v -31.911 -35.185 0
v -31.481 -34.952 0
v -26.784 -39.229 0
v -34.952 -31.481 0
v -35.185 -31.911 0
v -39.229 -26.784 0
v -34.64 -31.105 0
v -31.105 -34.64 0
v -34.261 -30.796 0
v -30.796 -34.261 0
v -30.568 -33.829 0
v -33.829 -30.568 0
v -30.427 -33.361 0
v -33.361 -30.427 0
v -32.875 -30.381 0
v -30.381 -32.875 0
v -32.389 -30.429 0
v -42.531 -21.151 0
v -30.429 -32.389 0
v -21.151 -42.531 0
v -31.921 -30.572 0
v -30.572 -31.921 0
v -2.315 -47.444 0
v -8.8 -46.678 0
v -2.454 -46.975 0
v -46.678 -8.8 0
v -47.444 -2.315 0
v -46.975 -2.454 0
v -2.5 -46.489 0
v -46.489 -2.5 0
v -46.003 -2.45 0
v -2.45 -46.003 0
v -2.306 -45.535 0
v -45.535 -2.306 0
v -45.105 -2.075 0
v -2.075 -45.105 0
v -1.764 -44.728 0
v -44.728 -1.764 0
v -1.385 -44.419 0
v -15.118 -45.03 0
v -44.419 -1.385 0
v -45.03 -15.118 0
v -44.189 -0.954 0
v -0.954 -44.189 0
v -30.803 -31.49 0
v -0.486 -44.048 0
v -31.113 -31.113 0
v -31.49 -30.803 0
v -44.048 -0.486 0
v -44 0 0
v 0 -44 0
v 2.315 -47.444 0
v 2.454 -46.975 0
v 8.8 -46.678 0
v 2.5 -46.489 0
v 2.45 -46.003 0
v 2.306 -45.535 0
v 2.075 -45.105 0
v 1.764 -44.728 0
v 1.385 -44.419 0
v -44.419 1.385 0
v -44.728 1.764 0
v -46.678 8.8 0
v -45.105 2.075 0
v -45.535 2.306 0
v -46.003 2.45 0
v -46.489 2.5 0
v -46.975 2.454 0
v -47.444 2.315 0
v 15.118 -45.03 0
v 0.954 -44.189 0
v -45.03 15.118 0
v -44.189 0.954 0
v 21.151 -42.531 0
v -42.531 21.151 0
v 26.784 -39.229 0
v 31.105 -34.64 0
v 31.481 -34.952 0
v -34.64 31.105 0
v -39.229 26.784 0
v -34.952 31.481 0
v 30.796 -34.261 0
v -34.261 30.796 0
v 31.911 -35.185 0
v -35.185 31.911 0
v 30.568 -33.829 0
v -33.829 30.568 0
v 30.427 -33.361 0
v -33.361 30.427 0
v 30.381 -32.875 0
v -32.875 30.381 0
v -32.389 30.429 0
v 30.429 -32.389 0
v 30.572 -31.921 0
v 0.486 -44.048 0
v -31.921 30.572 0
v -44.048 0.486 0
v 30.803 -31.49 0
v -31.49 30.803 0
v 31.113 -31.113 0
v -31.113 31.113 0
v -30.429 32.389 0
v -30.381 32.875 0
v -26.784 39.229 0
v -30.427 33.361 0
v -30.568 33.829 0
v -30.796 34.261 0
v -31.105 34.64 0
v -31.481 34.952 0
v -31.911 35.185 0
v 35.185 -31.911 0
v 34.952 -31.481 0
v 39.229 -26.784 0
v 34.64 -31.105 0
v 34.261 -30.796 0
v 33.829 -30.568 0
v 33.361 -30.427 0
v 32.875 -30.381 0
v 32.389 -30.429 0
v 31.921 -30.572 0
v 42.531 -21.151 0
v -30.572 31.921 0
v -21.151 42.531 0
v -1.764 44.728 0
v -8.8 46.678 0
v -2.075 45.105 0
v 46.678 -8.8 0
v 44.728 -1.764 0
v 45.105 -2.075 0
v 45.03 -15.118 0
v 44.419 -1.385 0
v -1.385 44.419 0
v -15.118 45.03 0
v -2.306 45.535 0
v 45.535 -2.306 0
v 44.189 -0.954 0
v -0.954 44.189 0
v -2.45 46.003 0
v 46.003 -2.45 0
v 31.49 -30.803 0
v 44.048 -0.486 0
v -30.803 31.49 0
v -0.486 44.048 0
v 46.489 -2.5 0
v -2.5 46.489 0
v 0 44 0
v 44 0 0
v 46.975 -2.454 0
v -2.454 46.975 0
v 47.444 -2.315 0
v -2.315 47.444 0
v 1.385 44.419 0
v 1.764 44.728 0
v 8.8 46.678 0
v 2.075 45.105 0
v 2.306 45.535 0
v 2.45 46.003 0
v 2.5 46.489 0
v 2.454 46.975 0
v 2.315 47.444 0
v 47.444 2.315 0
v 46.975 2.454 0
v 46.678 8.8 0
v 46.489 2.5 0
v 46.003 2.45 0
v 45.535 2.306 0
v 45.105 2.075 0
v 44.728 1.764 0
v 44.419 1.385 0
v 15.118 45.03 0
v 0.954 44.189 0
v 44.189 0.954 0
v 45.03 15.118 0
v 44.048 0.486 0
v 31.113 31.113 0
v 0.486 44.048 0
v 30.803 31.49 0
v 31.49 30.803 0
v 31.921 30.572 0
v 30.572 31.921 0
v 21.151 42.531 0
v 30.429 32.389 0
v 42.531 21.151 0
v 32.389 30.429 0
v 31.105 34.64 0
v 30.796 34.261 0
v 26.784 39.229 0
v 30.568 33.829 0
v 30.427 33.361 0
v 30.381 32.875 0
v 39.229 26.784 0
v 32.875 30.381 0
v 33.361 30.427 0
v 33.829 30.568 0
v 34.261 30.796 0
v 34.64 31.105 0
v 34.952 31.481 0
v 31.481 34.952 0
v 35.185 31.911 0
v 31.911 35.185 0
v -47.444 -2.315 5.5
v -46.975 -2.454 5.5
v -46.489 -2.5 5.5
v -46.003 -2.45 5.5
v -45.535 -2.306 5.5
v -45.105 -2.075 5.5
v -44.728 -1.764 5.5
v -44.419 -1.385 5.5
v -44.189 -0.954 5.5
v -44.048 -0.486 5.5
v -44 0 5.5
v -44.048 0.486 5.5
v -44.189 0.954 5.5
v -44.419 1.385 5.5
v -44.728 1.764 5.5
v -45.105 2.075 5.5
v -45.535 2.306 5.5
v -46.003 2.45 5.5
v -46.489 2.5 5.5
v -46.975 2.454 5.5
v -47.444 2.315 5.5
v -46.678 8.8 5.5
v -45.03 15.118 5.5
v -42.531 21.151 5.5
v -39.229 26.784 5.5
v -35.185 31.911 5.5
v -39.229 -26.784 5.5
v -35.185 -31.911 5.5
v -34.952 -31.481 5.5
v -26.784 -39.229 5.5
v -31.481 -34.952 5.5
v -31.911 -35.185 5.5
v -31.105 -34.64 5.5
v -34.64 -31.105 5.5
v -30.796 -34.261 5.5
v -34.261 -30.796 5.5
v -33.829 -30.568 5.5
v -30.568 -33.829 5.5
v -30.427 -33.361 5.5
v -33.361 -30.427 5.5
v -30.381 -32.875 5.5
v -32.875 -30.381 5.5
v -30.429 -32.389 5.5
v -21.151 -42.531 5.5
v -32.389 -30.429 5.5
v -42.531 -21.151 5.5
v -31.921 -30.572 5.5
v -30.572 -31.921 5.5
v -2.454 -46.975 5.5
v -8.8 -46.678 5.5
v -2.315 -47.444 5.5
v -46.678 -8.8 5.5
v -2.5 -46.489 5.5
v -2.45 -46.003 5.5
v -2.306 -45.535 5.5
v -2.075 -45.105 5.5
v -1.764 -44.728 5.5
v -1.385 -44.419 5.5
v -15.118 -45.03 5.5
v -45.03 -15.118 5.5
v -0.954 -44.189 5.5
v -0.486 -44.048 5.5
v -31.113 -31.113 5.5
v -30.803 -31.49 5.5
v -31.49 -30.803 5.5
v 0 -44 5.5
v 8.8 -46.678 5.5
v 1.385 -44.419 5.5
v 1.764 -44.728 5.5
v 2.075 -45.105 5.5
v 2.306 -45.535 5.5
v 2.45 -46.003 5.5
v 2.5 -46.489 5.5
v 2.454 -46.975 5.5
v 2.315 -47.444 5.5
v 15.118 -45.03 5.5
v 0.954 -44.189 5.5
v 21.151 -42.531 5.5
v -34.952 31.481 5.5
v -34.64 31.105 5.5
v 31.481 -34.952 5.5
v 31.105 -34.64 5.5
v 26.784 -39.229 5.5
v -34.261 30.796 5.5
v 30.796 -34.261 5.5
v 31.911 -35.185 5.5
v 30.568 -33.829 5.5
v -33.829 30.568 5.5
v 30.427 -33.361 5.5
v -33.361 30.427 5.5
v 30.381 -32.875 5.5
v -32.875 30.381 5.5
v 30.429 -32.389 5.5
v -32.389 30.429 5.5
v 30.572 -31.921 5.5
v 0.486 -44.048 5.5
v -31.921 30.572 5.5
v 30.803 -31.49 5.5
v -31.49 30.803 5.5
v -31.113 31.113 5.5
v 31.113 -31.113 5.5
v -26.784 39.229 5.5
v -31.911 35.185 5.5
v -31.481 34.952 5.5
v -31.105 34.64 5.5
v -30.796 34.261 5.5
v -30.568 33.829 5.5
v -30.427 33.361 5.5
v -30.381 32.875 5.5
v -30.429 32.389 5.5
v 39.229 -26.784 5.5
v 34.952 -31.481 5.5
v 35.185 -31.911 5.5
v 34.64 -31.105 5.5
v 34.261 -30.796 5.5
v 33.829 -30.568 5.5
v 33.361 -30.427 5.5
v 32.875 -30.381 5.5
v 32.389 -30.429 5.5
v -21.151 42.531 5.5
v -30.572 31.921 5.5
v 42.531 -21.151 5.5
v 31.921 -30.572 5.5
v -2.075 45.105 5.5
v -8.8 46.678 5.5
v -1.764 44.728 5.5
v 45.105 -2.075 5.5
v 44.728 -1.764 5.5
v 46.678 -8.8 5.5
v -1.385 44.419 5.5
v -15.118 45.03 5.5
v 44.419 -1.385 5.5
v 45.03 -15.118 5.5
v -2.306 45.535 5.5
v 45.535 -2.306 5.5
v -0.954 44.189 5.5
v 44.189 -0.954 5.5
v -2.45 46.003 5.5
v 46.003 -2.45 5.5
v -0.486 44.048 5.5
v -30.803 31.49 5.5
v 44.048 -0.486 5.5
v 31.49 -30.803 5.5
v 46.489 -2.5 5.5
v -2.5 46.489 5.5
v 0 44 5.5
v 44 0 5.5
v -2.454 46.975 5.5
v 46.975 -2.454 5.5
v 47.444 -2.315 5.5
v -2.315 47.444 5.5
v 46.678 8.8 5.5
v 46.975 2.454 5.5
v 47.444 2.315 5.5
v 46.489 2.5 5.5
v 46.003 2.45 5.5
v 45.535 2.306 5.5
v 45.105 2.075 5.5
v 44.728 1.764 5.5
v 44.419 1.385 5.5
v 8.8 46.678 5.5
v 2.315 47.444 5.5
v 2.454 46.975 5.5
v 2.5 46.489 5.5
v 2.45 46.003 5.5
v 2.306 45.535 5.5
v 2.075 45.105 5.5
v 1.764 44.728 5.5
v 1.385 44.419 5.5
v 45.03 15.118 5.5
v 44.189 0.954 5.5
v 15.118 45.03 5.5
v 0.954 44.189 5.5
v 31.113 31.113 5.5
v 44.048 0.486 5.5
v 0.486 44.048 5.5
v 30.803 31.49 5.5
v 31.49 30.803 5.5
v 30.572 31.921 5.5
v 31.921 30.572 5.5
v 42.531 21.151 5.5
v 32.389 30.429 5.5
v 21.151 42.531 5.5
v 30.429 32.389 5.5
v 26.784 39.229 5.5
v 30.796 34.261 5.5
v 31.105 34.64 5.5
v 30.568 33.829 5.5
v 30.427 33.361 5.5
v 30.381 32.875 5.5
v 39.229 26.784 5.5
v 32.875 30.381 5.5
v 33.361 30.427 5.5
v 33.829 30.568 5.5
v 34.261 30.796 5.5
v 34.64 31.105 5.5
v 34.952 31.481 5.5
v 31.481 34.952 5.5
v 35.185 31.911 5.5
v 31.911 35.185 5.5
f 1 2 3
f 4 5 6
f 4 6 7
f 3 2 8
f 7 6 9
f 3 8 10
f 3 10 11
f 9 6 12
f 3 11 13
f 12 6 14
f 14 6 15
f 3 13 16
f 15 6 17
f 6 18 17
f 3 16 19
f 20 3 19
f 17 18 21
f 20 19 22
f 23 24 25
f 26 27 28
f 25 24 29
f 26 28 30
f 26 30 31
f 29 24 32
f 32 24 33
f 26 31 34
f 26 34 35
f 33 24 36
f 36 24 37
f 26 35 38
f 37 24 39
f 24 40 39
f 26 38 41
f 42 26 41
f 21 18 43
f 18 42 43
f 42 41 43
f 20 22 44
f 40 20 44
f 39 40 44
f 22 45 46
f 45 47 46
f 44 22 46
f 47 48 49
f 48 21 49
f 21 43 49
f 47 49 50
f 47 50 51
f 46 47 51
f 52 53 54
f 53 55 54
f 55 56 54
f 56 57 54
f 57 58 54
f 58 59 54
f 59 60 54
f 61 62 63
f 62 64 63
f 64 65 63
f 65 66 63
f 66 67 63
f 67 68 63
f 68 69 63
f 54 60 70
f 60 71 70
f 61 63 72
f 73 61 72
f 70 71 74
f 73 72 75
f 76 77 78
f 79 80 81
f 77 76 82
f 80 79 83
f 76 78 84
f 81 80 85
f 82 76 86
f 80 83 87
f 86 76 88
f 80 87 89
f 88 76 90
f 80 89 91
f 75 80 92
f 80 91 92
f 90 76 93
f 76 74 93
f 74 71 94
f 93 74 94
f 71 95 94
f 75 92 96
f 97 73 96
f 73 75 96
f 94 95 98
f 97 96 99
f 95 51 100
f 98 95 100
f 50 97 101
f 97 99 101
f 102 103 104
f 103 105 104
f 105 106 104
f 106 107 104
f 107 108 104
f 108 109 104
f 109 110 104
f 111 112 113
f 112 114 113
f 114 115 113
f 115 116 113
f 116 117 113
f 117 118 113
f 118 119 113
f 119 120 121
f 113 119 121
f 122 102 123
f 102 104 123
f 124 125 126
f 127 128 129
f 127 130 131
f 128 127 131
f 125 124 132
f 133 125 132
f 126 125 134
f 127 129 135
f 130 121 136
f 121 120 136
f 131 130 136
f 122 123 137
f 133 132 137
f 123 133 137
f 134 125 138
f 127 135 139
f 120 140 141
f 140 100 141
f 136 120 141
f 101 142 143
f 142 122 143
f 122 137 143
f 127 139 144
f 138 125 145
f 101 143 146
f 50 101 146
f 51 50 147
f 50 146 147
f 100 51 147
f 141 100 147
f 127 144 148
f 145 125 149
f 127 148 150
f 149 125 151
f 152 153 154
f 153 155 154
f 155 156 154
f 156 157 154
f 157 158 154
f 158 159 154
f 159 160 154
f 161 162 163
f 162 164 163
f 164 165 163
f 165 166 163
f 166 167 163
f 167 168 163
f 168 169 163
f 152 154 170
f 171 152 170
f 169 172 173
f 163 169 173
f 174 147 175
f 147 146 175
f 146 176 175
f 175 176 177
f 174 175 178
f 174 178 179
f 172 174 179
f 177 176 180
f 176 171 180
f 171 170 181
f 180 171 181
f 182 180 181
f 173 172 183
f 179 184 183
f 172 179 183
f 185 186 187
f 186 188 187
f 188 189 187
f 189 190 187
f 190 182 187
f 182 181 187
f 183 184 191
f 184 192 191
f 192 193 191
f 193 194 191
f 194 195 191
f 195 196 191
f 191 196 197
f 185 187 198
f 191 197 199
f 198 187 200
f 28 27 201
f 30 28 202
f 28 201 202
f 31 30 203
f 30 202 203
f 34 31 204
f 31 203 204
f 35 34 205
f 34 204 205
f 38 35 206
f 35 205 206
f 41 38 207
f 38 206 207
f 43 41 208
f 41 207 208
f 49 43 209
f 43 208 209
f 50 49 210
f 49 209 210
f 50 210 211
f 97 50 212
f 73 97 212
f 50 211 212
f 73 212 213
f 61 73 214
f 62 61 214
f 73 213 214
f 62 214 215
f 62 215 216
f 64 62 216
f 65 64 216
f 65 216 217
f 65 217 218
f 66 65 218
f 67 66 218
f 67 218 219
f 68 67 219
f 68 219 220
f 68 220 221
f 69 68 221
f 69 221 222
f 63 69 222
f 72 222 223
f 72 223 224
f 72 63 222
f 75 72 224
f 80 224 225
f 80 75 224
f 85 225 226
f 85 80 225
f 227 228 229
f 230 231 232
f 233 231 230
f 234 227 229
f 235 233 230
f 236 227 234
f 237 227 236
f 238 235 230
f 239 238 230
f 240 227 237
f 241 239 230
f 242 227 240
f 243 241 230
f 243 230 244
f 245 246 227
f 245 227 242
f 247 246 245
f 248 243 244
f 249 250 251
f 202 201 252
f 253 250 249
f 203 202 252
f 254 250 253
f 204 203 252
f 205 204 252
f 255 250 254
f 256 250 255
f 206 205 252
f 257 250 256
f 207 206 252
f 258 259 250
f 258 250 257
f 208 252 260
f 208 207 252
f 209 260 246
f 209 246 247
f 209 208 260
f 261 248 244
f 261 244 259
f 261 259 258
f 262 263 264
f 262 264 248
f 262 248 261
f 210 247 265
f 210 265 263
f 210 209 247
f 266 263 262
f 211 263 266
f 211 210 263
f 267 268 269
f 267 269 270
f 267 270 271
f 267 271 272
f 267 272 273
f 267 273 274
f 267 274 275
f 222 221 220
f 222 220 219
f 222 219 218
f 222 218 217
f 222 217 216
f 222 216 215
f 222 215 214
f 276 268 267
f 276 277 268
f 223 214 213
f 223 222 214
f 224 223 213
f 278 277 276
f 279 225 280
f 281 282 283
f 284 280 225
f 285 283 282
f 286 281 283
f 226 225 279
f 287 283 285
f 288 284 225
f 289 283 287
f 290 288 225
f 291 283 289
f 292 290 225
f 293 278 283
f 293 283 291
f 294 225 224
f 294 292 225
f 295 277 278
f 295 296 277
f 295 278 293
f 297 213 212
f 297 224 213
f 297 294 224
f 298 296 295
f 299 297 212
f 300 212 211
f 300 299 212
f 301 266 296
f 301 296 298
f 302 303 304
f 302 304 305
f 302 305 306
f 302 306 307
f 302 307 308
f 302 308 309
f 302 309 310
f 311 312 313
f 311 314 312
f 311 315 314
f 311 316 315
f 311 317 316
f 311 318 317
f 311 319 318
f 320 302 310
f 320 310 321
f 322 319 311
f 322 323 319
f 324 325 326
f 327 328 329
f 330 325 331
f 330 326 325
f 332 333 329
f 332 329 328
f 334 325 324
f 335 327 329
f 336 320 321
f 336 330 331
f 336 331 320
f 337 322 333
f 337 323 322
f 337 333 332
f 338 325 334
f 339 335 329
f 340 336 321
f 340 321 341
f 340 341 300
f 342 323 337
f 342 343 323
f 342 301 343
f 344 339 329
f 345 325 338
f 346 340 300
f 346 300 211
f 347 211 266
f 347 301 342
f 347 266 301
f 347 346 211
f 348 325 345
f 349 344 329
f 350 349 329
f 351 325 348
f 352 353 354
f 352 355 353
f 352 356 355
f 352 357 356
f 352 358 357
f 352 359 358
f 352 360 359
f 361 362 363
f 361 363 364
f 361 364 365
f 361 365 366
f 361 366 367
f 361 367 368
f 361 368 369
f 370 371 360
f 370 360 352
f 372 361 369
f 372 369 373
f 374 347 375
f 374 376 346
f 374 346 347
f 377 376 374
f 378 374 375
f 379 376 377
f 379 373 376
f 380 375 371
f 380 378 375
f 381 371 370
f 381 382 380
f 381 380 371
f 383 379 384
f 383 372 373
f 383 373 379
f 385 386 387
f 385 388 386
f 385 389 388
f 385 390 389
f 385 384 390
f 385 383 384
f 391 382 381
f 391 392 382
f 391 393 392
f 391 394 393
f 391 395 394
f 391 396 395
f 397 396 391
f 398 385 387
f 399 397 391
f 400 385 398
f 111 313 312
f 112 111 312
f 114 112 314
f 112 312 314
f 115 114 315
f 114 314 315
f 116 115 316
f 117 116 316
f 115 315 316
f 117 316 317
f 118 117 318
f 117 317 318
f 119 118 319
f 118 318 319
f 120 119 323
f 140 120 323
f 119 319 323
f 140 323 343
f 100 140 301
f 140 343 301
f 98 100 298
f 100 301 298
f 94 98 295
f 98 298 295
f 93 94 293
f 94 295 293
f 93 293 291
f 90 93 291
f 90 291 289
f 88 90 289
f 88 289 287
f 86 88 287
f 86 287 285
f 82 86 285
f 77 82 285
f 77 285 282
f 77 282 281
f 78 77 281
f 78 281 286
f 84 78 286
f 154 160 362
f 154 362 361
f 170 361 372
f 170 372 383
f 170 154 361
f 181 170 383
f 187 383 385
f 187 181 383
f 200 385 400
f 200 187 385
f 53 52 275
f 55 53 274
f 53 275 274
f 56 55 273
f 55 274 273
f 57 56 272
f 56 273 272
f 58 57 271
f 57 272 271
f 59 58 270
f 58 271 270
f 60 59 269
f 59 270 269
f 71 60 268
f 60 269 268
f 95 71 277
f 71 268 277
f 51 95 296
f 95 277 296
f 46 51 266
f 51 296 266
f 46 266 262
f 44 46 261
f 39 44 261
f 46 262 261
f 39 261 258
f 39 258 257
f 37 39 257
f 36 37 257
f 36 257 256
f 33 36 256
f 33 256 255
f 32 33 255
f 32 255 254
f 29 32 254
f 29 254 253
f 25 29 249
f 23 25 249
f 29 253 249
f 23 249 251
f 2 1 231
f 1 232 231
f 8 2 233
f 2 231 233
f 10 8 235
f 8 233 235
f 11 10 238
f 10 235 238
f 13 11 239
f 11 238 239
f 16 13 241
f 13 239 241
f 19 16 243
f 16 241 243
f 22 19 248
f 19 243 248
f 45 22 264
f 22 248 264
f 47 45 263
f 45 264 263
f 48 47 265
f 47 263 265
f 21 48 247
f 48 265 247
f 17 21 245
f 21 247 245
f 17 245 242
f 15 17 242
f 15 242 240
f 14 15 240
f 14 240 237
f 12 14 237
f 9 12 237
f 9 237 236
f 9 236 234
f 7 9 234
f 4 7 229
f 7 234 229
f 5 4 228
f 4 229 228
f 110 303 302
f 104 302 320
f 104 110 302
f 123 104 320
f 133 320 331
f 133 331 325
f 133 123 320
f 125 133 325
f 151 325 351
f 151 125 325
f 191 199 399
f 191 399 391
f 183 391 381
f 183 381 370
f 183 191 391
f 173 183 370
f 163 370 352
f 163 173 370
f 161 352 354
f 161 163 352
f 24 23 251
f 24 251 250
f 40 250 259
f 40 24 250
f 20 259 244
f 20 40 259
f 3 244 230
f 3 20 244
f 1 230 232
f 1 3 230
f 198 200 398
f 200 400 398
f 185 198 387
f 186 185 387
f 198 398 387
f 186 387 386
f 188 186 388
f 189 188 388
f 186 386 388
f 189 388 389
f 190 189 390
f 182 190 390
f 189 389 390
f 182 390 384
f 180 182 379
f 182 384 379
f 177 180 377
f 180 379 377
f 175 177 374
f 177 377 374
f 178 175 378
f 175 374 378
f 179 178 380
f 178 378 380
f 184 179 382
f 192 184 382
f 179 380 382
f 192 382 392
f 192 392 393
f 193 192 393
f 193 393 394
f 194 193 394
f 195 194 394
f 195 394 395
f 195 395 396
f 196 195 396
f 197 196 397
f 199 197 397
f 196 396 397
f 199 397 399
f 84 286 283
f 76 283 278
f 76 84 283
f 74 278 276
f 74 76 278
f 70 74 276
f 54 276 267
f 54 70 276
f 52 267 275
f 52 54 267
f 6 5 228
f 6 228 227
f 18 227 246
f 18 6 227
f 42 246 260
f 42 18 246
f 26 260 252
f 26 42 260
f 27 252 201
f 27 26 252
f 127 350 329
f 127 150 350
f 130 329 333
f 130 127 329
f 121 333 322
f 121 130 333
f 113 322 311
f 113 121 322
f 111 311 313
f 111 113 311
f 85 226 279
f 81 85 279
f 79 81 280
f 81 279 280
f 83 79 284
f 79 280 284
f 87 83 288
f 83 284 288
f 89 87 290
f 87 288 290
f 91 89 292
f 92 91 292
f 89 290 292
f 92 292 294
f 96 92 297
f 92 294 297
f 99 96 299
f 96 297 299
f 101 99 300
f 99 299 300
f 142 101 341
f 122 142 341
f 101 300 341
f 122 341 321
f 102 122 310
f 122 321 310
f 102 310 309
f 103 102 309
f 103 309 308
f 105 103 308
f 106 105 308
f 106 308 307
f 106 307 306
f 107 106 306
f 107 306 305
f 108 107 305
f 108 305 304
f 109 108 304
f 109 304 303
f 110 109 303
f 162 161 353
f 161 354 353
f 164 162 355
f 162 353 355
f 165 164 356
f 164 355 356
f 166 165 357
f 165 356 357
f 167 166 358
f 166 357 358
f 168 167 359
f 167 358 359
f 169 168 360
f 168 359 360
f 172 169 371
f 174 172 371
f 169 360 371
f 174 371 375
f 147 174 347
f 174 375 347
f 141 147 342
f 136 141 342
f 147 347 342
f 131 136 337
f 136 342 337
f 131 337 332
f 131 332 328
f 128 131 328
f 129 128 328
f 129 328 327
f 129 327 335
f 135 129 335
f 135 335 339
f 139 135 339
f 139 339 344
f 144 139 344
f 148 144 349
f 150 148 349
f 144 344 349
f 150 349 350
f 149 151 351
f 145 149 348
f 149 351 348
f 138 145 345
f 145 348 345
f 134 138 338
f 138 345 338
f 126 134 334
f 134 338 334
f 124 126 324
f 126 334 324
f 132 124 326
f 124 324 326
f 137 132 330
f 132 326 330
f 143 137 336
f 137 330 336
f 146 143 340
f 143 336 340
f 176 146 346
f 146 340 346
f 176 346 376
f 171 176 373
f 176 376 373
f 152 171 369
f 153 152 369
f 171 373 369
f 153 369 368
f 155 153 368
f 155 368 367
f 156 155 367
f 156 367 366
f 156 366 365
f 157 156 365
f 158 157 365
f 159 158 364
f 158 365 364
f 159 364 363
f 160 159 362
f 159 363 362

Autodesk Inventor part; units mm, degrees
ref_plane "YZ Plane" through (0, 0, 0) normal (1, 0, 0) x (0, 1, 0)
ref_plane "XZ Plane" through (0, 0, 0) normal (0, 1, 0) x (-1, 0, 0)
ref_plane "XY Plane" through (0, 0, 0) normal (0, 0, 1) x (1, 0, 0)
sketch "Sketch1" plane through (0, 0, 0) normal (0, 0, 1) x (1, 0, 0)
  circle A0 centre (0, 0) radius 47.5
  circle A1 centre (46.5, 0) radius 2.5
  dimension "d0" = 95
  dimension "d1" = 5
extrude "Extrusion1" add sketch "Sketch1" along normal blind 5.5 contours A0 A1 | A1 A0 picked at (46.4291, -0.6491) picked at (-16.8425, 0)
sketch "Sketch2" plane through (0, 0, 5.5) normal (0, 0, 1) x (1, 0, 0)
  circle A0 centre (46.5, 0) radius 2.5
  circle A1 centre (32.8805, 32.8805) radius 2.5
  circle A2 centre (0, 46.5) radius 2.5
  circle A3 centre (-32.8805, 32.8805) radius 2.5
  circle A4 centre (-46.5, 0) radius 2.5
  circle A5 centre (-32.8805, -32.8805) radius 2.5
  circle A6 centre (0, -46.5) radius 2.5
  circle A7 centre (32.8805, -32.8805) radius 2.5
  point P0 (0, 0)
  dimension "d4" = 5
  dimension "d7" = 360
extrude "Extrusion2" cut sketch "Sketch2" against normal blind 5.5
properties part number "tapa"
